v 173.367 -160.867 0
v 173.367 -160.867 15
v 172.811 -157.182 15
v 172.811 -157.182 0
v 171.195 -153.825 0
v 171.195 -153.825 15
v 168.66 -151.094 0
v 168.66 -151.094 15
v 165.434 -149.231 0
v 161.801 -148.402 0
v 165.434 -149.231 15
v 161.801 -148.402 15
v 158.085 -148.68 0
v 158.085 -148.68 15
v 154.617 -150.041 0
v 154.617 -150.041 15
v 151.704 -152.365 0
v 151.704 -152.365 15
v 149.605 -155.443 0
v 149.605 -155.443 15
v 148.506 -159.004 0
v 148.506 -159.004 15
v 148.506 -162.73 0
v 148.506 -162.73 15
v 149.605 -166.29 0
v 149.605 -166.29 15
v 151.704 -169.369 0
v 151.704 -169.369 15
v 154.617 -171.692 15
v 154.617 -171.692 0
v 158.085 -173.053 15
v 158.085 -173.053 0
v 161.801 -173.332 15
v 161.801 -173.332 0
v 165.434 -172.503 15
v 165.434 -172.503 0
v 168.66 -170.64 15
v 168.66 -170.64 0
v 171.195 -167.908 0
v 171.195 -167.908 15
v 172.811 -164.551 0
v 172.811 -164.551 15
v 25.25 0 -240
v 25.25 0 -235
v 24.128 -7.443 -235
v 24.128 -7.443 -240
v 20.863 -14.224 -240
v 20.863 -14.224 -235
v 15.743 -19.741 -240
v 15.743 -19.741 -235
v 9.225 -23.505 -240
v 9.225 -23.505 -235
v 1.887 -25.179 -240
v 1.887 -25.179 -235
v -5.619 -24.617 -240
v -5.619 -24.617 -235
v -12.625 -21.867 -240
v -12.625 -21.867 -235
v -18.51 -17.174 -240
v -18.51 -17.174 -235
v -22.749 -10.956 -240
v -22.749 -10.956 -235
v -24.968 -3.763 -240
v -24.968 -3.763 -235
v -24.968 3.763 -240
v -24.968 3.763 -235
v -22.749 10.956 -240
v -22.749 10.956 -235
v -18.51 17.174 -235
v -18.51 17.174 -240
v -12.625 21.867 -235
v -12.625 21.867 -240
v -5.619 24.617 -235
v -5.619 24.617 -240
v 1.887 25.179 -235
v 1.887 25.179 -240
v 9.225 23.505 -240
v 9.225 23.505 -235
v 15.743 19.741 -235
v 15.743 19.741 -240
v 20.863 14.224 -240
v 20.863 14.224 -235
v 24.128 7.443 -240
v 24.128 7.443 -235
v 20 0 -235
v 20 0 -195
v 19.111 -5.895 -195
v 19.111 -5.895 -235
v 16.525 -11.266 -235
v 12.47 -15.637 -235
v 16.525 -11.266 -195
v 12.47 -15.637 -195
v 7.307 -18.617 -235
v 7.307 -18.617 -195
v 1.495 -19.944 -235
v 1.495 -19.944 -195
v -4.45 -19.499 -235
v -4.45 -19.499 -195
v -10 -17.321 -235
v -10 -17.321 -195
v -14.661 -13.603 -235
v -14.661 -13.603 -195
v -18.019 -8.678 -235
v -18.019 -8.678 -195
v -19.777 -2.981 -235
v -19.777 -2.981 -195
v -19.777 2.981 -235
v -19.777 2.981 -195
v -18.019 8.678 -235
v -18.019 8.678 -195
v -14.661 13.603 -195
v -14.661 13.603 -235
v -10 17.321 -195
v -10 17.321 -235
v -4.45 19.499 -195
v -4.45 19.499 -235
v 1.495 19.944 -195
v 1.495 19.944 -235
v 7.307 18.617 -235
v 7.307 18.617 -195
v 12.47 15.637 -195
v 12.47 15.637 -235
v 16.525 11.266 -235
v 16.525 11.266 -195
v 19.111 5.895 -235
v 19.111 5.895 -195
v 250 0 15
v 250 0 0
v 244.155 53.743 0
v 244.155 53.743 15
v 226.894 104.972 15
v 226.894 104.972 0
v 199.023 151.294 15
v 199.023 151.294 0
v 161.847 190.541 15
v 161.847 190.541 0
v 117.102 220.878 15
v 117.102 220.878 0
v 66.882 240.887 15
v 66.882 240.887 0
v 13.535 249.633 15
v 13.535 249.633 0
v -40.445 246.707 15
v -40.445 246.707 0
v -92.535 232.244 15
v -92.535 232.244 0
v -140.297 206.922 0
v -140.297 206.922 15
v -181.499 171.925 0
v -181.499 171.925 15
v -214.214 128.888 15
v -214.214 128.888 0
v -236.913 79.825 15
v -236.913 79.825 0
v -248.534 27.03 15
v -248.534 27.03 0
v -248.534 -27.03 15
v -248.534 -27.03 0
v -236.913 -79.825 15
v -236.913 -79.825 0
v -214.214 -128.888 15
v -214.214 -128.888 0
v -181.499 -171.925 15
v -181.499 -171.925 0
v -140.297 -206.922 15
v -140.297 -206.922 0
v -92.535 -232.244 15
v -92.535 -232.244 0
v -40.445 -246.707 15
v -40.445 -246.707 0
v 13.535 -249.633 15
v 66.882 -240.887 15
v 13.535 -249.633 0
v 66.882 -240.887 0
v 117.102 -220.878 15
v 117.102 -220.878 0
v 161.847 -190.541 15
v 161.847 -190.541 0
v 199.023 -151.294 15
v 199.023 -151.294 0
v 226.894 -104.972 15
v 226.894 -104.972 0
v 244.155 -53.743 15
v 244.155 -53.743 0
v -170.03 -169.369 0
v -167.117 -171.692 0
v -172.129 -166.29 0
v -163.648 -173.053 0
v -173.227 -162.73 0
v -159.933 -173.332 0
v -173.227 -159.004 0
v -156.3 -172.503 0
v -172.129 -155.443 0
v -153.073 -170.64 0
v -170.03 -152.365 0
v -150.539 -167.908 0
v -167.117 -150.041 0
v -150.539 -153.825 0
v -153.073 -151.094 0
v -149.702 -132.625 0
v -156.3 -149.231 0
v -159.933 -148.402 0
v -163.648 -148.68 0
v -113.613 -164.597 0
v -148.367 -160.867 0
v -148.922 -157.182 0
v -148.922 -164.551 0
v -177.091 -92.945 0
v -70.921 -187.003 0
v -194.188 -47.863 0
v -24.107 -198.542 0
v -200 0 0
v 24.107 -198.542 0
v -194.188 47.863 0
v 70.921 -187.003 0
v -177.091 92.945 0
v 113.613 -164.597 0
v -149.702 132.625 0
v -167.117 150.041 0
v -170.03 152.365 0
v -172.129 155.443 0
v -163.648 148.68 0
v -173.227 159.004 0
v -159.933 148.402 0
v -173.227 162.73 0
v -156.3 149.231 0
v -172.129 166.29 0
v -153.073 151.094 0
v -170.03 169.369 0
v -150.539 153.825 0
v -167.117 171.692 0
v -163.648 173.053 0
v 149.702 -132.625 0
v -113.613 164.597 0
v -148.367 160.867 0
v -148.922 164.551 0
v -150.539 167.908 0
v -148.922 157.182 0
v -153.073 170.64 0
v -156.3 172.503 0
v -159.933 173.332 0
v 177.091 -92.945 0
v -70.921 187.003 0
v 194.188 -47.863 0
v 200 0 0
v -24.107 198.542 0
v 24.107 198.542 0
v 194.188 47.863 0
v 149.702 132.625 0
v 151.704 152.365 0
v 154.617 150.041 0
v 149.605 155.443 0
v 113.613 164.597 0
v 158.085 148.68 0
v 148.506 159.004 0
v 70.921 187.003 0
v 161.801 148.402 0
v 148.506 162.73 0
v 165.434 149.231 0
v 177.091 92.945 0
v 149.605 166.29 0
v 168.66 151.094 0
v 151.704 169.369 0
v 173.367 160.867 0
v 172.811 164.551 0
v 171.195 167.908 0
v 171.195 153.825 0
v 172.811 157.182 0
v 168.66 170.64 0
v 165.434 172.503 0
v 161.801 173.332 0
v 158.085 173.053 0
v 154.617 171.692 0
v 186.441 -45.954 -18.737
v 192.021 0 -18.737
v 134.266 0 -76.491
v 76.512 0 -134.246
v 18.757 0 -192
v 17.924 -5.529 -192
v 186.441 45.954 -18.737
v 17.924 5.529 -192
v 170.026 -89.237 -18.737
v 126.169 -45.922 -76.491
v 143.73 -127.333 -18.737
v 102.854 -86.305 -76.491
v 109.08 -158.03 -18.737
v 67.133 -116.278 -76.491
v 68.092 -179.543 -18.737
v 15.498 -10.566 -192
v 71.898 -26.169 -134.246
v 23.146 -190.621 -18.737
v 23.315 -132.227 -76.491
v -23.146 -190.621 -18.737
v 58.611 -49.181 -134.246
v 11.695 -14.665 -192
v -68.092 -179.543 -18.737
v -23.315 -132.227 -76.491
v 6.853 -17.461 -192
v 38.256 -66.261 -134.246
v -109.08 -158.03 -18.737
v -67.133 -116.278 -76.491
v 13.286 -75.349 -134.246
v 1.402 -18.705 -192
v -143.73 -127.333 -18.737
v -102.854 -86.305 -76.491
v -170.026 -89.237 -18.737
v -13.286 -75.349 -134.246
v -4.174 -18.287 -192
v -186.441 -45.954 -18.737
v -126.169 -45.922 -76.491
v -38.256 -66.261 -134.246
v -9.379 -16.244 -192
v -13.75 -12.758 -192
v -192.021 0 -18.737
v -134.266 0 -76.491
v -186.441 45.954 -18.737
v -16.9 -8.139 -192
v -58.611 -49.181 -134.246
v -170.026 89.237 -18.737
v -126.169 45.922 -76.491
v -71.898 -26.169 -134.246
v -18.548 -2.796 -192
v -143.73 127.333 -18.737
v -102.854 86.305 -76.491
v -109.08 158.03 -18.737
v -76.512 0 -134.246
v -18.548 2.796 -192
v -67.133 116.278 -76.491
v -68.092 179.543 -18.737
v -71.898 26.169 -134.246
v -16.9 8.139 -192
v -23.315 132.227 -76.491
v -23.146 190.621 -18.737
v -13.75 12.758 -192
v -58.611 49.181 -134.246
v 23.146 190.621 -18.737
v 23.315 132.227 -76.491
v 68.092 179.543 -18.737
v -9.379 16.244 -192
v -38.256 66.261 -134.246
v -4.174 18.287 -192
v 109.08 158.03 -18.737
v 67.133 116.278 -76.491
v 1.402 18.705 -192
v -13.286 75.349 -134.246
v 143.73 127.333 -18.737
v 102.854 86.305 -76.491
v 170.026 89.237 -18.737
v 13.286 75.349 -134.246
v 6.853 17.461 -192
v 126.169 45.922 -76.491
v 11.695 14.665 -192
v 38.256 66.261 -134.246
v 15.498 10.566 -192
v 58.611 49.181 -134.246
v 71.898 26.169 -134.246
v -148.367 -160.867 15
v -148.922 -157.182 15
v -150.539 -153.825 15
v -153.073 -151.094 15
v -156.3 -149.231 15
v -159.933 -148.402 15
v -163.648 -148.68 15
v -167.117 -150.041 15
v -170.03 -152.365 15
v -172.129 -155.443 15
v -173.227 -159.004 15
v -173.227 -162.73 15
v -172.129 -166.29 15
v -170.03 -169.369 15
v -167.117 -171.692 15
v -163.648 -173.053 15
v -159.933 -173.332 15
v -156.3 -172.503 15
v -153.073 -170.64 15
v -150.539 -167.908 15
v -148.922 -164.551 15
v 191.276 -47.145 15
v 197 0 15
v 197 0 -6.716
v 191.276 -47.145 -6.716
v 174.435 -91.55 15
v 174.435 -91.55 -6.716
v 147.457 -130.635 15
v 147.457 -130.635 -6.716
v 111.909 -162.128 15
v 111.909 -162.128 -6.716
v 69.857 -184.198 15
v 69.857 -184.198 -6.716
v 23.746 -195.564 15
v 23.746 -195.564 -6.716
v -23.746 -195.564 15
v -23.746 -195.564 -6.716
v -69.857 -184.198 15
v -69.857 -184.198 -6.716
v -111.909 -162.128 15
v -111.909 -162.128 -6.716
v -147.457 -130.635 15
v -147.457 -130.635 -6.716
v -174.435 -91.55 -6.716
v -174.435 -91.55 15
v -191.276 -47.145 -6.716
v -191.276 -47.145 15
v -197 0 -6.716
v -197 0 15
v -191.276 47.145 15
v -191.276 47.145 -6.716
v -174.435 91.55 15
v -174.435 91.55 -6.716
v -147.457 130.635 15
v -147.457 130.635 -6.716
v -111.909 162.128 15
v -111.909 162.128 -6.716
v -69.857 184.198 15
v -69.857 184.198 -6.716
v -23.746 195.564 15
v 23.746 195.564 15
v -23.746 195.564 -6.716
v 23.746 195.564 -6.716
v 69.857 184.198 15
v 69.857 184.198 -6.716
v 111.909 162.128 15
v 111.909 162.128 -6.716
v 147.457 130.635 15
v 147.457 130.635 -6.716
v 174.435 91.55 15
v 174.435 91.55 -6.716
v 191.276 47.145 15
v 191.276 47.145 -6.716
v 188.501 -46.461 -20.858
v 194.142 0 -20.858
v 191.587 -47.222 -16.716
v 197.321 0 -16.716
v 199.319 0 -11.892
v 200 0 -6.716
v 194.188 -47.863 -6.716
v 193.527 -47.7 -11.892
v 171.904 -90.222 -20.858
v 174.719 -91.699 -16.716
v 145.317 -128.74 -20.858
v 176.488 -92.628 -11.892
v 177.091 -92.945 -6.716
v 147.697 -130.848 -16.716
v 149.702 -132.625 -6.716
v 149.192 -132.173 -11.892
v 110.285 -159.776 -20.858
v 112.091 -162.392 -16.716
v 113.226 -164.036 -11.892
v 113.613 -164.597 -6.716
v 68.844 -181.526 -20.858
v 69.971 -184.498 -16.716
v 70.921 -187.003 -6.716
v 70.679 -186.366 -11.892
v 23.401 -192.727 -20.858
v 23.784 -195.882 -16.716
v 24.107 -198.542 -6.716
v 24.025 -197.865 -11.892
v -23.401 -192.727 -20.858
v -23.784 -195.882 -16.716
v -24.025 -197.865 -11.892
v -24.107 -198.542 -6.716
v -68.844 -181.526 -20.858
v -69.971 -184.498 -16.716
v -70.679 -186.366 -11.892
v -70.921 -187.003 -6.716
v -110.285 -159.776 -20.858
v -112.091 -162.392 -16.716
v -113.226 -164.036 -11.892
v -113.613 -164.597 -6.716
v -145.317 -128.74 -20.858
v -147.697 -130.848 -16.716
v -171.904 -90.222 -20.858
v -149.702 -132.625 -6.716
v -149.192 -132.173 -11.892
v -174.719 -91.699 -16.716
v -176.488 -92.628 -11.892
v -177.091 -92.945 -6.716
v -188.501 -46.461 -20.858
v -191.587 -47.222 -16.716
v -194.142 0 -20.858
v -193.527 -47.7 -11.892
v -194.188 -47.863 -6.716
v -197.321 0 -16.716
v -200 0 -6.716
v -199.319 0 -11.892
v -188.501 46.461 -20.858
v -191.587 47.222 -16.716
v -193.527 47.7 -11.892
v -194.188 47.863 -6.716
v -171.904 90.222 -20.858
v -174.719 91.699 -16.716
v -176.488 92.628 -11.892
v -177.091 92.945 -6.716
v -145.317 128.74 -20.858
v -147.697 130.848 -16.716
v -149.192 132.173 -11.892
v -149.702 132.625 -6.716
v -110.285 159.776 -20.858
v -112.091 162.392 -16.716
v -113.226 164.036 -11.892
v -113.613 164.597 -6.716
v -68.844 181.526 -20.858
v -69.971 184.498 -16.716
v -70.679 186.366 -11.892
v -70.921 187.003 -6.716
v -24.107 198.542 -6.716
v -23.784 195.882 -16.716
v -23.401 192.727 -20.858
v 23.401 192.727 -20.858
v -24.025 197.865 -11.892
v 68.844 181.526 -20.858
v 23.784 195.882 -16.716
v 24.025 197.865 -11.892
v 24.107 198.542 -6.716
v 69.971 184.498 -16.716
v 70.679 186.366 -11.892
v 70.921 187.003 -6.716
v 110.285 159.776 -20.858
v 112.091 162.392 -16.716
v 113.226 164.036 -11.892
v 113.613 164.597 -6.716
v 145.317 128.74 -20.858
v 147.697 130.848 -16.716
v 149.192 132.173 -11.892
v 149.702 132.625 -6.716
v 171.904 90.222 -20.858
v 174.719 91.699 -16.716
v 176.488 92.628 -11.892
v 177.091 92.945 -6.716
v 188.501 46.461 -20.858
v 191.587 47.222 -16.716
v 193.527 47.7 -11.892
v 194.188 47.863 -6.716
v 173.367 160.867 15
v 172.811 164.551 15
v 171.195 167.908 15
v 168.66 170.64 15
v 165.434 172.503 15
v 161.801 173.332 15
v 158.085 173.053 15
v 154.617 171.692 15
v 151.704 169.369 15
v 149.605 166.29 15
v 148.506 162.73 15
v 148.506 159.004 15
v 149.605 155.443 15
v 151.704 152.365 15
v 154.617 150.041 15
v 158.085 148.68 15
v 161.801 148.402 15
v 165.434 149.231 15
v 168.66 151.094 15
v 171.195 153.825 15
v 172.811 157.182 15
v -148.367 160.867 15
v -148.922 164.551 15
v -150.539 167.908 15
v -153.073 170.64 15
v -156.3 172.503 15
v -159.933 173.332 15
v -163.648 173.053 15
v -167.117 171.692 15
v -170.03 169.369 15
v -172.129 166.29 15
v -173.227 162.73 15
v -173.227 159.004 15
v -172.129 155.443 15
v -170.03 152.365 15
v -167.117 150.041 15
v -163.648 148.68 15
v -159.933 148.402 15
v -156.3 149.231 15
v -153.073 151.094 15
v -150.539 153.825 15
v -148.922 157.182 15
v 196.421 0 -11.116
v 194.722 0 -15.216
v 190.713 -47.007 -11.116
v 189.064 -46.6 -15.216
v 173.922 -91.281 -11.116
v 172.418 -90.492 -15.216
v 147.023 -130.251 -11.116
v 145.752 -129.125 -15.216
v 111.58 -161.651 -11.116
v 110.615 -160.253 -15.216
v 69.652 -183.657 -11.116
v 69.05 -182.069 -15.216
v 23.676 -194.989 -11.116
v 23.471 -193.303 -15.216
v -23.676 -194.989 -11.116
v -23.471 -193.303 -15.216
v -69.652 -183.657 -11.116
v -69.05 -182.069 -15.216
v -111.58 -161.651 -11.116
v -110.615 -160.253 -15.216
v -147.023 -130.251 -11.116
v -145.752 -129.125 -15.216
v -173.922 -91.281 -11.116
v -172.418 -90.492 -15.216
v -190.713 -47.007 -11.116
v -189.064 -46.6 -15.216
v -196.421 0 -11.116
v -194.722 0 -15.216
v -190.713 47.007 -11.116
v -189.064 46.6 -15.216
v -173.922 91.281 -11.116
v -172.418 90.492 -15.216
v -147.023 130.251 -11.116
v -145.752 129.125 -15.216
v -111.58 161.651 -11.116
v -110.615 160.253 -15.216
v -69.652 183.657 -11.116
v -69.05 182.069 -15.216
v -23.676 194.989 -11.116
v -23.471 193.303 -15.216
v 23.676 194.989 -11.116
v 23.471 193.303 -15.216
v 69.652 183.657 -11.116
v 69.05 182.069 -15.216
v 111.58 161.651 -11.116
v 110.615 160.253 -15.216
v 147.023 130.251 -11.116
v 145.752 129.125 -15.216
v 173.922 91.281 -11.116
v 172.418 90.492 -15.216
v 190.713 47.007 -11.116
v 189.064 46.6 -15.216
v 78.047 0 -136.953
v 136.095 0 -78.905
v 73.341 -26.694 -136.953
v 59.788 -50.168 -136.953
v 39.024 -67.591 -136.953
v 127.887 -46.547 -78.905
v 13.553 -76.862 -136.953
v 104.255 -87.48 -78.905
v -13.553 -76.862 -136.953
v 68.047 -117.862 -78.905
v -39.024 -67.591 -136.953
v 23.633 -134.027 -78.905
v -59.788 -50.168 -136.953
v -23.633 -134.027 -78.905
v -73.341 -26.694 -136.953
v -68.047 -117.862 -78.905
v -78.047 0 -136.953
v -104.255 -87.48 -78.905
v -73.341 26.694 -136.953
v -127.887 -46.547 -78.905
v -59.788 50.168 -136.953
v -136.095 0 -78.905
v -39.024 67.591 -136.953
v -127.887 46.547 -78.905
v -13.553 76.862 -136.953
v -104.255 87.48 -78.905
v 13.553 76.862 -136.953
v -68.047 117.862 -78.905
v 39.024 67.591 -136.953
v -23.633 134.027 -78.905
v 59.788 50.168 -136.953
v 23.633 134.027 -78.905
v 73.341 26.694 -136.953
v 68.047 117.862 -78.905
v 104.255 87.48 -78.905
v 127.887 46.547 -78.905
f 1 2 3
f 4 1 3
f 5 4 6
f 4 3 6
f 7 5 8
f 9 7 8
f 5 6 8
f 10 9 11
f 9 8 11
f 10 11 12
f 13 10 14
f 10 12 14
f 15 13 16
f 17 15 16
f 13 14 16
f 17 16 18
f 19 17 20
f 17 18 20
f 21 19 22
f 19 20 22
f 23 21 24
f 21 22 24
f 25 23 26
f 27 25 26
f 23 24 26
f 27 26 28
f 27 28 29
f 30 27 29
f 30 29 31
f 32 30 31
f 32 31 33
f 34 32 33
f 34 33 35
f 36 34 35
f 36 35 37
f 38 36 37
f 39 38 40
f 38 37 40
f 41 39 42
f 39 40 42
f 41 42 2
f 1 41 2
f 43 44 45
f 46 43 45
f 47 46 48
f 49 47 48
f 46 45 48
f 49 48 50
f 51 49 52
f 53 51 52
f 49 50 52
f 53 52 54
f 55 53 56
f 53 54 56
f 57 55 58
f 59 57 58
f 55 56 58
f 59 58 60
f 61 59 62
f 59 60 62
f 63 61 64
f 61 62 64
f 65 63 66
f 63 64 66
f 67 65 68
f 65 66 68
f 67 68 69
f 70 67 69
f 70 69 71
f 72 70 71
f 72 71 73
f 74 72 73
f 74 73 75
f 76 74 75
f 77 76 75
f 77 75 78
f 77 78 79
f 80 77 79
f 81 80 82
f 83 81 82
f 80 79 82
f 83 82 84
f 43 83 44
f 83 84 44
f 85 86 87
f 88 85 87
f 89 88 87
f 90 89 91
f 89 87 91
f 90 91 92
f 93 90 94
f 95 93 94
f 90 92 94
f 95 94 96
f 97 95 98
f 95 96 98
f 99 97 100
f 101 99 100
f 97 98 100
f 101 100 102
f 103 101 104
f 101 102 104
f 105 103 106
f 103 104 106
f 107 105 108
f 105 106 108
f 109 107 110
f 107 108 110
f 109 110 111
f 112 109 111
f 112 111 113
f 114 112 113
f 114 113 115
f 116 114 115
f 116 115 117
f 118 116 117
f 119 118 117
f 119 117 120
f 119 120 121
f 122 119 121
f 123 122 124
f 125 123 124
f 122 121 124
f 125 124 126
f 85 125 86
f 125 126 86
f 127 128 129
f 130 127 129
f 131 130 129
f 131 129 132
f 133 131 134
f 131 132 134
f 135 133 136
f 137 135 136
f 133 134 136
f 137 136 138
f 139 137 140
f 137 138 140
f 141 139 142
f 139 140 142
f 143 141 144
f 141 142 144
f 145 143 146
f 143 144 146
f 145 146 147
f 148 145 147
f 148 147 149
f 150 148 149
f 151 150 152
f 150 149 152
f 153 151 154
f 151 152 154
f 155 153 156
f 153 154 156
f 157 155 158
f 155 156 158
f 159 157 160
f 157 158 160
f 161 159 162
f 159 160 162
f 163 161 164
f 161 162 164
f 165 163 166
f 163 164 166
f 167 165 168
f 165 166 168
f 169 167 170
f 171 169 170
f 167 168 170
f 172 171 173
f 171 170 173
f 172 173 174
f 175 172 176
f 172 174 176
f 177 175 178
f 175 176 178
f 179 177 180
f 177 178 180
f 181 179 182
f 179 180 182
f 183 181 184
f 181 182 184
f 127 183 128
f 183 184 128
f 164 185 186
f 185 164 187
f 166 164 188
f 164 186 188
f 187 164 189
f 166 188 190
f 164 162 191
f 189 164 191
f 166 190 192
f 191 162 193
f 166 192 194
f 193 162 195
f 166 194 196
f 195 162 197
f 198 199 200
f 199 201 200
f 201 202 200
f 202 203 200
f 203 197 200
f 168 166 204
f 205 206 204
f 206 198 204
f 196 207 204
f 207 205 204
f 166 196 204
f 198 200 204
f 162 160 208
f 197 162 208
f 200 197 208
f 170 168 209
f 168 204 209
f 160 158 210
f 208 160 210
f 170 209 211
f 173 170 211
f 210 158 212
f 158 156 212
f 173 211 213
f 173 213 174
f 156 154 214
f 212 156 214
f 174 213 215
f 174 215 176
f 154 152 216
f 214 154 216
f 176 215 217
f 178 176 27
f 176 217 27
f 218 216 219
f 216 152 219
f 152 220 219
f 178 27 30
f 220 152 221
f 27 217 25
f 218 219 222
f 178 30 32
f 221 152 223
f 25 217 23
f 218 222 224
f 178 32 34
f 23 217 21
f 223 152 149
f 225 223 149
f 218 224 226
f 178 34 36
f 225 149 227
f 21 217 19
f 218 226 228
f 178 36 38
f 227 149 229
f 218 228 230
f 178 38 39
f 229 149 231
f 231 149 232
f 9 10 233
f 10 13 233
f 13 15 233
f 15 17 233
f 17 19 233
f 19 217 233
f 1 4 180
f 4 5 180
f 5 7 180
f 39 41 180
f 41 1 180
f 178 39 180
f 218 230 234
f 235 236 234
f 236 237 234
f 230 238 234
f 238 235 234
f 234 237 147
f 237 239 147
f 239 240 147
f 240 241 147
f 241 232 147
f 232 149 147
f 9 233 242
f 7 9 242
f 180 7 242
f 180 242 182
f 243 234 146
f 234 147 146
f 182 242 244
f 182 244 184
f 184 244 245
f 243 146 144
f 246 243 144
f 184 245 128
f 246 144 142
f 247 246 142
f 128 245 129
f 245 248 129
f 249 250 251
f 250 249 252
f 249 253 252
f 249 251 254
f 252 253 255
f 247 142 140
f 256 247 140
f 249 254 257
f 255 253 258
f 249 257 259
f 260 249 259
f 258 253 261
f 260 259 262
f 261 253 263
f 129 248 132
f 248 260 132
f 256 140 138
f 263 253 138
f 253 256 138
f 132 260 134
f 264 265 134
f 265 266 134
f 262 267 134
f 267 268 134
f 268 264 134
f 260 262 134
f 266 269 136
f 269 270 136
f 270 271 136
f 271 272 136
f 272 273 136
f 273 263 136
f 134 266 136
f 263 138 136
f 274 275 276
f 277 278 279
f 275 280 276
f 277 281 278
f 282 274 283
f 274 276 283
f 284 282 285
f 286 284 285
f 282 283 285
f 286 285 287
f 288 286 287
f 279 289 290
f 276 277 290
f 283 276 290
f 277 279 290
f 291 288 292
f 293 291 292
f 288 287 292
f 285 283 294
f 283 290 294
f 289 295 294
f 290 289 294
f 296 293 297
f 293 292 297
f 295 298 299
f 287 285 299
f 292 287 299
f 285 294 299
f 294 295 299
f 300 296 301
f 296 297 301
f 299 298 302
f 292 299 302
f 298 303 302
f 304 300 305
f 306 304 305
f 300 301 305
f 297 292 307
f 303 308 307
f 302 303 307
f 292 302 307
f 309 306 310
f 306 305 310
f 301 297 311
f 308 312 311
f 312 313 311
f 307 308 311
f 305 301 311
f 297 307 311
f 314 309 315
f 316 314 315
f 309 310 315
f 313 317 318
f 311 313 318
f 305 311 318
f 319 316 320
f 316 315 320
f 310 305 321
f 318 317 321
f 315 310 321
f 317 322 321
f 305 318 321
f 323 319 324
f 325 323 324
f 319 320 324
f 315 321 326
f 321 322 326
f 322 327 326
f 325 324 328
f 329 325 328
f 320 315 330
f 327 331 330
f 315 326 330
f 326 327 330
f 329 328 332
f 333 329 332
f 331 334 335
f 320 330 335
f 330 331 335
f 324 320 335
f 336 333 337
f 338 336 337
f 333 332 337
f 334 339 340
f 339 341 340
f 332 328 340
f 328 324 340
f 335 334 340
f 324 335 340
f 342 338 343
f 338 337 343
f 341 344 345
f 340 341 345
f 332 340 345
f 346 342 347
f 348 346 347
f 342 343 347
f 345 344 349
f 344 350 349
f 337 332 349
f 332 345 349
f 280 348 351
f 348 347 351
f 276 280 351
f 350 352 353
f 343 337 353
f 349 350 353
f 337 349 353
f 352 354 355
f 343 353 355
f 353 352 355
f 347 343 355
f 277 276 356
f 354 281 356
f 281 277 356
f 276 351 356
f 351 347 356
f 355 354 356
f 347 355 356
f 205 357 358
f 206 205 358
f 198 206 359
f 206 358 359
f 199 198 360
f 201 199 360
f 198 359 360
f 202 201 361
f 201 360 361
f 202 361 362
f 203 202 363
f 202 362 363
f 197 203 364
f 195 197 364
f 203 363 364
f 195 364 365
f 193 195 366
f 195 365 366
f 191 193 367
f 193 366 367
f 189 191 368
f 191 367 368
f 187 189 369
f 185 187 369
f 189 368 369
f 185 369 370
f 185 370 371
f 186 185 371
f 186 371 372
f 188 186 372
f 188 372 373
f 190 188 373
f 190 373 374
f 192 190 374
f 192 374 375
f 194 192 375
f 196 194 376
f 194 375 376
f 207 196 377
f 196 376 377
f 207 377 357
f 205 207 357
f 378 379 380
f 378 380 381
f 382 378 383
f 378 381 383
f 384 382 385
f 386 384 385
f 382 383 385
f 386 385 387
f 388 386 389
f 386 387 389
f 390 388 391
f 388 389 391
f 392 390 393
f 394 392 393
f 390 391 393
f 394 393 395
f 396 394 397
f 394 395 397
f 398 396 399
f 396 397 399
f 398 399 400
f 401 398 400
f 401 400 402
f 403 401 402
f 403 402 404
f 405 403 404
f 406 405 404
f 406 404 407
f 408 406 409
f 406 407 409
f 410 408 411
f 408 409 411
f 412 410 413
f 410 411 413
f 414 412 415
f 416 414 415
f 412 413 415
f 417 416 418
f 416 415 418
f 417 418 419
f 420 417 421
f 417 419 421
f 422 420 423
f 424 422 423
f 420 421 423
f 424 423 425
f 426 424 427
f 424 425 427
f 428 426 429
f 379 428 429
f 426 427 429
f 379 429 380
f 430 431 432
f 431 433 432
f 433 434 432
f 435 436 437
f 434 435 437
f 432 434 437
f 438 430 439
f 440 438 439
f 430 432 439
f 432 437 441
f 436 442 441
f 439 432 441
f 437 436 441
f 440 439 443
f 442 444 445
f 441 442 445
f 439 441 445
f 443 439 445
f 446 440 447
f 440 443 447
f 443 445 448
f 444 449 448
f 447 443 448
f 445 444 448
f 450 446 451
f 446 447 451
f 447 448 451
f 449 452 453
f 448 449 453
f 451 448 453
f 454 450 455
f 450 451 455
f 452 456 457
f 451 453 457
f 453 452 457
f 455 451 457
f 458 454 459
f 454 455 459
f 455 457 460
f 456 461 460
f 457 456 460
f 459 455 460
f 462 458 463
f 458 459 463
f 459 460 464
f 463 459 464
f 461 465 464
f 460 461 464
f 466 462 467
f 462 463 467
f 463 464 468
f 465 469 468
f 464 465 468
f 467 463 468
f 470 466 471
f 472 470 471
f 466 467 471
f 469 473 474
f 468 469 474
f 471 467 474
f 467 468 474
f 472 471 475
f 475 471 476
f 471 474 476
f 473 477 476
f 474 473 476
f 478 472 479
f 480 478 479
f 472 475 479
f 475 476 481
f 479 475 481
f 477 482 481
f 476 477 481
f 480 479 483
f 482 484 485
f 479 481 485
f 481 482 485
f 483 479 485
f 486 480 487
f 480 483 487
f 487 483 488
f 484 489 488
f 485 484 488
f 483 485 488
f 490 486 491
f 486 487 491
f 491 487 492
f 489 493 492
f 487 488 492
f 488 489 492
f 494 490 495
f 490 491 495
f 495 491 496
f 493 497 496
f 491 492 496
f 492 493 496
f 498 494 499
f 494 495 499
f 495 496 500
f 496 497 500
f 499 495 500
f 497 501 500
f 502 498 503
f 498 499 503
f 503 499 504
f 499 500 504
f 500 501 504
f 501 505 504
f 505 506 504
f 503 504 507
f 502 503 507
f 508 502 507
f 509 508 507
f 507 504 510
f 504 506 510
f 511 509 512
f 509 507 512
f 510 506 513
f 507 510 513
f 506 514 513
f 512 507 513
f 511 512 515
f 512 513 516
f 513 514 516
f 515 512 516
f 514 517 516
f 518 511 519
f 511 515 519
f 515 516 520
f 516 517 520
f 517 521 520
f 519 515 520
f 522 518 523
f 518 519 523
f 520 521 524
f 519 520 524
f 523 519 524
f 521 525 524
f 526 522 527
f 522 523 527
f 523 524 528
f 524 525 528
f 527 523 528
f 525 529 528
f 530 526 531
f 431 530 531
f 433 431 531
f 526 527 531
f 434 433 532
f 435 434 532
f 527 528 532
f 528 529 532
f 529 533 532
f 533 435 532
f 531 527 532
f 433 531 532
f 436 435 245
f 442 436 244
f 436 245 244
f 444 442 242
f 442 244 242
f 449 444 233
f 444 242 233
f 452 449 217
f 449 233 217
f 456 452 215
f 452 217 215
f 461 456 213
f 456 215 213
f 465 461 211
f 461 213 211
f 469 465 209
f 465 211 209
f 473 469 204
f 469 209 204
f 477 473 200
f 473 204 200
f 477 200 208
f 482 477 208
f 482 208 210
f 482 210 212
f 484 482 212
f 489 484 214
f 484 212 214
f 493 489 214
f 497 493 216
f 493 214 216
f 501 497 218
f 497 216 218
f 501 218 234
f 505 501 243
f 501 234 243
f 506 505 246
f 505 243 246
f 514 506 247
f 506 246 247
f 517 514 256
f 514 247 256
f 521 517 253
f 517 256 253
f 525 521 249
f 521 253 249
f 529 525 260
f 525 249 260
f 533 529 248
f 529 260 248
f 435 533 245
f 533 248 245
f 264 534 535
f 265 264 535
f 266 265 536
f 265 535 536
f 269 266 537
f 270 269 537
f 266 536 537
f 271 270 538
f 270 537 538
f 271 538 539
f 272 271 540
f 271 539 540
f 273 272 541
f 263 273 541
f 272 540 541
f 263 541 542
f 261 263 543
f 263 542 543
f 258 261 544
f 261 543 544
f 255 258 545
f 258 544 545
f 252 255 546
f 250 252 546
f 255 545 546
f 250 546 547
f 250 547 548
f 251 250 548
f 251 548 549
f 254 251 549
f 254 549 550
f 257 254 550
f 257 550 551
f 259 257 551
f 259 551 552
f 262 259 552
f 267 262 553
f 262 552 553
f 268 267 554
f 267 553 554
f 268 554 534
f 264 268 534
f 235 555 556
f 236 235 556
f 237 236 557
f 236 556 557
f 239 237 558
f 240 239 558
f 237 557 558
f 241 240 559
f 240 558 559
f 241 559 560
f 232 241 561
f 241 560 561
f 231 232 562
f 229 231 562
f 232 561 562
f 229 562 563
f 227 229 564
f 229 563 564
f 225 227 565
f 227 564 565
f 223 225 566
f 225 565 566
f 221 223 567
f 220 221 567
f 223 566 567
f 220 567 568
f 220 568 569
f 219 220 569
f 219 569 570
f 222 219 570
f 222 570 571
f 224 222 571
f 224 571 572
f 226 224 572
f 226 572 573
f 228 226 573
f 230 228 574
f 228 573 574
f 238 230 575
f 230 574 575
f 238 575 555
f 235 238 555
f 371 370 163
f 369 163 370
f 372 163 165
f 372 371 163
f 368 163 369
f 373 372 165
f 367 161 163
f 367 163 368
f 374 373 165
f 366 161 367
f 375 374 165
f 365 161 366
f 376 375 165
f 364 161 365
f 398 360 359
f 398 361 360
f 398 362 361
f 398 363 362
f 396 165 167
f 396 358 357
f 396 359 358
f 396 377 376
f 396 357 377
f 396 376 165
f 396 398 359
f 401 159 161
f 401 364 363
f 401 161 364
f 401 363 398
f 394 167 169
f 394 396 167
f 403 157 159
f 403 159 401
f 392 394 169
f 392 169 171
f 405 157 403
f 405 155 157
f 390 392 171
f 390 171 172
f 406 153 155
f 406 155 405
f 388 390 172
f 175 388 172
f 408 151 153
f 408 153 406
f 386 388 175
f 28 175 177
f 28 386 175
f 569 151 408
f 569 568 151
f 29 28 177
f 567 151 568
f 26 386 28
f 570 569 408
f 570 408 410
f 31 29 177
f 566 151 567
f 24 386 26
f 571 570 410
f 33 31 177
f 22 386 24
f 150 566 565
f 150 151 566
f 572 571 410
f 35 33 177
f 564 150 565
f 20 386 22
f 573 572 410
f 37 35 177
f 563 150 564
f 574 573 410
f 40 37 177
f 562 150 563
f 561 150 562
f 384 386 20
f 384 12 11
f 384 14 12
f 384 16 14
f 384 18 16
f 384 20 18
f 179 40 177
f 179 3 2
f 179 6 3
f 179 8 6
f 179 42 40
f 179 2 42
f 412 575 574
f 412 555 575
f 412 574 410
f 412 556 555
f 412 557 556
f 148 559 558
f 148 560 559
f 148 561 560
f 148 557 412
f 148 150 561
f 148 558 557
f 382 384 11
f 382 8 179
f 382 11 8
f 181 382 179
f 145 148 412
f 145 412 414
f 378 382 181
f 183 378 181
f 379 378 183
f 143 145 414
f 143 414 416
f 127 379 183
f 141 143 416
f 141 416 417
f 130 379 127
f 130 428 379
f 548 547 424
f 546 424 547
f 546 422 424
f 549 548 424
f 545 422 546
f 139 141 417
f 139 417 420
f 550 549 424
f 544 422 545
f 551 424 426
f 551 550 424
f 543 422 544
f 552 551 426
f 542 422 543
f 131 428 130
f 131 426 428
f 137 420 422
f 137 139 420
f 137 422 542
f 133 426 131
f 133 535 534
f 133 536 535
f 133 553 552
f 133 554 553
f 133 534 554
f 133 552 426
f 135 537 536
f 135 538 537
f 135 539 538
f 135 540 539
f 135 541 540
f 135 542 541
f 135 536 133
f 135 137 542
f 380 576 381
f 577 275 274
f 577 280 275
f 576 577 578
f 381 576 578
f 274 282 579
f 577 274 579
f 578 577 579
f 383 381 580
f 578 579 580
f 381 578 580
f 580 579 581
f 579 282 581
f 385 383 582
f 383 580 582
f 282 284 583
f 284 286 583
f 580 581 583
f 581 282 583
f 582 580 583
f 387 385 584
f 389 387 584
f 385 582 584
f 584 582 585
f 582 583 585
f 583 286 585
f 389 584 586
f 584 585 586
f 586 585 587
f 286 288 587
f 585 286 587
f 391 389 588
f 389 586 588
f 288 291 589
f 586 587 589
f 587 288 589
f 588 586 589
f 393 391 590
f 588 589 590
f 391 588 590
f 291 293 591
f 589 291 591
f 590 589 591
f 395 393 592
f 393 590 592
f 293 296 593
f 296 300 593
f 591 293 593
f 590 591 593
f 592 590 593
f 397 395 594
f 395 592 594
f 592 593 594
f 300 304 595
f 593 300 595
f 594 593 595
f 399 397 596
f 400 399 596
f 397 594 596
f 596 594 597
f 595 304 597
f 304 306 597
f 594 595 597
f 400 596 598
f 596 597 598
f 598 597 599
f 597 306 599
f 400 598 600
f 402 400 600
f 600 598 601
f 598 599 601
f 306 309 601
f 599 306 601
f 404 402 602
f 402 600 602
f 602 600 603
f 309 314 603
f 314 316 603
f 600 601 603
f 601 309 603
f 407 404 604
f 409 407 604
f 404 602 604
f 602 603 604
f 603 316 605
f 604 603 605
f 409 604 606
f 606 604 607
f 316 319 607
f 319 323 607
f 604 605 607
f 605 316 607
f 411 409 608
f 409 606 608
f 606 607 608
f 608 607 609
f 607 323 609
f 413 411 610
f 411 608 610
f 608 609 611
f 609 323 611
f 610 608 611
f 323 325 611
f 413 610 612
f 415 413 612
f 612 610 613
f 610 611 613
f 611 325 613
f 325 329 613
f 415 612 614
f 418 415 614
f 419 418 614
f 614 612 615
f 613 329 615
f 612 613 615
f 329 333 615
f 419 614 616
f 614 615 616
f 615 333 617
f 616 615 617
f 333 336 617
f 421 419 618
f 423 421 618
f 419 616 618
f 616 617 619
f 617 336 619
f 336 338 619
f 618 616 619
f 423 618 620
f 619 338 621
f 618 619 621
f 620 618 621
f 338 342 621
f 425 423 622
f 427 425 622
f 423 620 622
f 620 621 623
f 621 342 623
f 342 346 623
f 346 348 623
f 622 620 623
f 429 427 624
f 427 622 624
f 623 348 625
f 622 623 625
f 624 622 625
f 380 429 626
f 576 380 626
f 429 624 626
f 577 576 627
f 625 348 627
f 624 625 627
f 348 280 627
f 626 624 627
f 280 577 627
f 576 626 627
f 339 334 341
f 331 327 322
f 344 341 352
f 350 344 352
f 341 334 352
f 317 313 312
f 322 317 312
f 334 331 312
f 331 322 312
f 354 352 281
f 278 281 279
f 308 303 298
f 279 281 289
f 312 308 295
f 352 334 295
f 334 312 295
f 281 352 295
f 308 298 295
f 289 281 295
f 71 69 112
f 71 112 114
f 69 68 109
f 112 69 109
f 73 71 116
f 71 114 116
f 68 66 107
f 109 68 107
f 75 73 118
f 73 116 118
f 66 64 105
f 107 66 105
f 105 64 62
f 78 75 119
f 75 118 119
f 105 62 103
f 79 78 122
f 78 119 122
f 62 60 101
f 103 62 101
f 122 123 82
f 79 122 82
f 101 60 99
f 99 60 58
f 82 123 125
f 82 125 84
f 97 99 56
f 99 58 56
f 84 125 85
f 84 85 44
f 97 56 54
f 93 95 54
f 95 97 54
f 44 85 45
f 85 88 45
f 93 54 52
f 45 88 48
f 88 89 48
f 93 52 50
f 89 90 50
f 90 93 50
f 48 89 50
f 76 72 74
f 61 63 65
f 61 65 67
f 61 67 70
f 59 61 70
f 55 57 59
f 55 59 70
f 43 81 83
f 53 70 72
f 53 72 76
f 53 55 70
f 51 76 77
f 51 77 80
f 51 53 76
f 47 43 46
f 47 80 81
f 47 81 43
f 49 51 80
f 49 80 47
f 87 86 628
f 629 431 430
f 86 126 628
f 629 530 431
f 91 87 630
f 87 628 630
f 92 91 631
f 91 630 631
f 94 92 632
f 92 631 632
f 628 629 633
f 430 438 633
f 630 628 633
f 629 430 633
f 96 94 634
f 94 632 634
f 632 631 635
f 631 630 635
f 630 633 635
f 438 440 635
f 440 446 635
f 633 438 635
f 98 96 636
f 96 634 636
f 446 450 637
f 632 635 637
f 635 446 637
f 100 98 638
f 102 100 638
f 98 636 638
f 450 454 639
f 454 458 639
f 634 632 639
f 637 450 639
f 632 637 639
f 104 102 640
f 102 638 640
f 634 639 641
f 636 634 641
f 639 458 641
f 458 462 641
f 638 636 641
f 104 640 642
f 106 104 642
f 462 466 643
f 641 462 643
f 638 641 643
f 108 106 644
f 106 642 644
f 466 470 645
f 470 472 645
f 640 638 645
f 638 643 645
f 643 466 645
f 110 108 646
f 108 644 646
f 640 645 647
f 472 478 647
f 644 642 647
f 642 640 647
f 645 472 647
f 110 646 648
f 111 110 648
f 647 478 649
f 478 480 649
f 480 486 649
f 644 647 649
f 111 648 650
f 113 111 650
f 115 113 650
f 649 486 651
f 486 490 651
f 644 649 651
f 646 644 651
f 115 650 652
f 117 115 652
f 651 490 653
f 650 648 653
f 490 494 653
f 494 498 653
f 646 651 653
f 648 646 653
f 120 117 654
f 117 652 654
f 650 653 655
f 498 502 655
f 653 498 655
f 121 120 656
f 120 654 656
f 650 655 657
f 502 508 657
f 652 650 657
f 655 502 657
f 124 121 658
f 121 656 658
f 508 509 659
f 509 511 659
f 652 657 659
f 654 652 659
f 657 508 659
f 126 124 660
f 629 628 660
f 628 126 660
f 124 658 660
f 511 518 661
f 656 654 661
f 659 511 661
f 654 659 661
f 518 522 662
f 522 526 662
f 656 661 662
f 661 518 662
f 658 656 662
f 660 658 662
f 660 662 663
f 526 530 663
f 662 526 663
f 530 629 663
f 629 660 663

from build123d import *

# Parameters (mm, degrees)
F0_R      = 250
F0_R_2    = 200
F1_DEPTH  = 15
F5_R      = 20
F6_DEPTH  = 40
F7_R      = 25.25
F8_DEPTH  = 5
F9_R      = 12.5
F10_DEPTH = 15


with BuildPart() as f1:
    # F0 (on Top) → F1 (new body)
    with BuildSketch(Plane.XY):
        Circle(F0_R)
        Circle(F0_R_2, mode=Mode.SUBTRACT)
    extrude(amount=F1_DEPTH)

    # F2 (on Front) → F3 (revolve)
    with BuildSketch(Plane.XZ):
        with BuildLine():
            Line((200, -6.715729), (200, 15))
            Line((200, 15), (197, 15))
            Line((197, 15), (197, -6.715729))
            ThreePointArc((197, -6.715729), (195.705952, -13.221347), (192.020815, -18.736544))
            Line((192.020815, -18.736544), (18.757359, -192))
            Line((18.757359, -192), (0, -192))
            Line((0, -192), (0, -195))
            Line((0, -195), (20, -195))
            Line((20, -195), (194.142136, -20.857864))
            ThreePointArc((194.142136, -20.857864), (198.477591, -14.369397), (200, -6.715729))
        make_face()
    revolve(axis=Axis((0, 0, -193.5), (0, 0, -1)))

    # F5 (on face) → F6 (join)
    with BuildSketch(Plane(origin=(0, 0, -195), x_dir=(1, 0, 0), z_dir=(0, 0, -1))):
        Circle(F5_R)
    extrude(amount=F6_DEPTH)

    # F7 (on face) → F8 (join)
    with BuildSketch(Plane(origin=(0, 0, -235), x_dir=(1, 0, 0), z_dir=(0, 0, -1))):
        Circle(F7_R)
    extrude(amount=F8_DEPTH)

    # F9 (on face) → F10 (cut)
    with BuildSketch(Plane.XY.offset(15)):
        with Locations((160.866793, 160.866793)):
            Circle(F9_R)
        with Locations((-160.866793, 160.866793)):
            Circle(F9_R)
        with Locations((-160.866793, -160.866793)):
            Circle(F9_R)
        with Locations((160.866793, -160.866793)):
            Circle(F9_R)
    extrude(amount=-F10_DEPTH, mode=Mode.SUBTRACT)


solid = f1.part
